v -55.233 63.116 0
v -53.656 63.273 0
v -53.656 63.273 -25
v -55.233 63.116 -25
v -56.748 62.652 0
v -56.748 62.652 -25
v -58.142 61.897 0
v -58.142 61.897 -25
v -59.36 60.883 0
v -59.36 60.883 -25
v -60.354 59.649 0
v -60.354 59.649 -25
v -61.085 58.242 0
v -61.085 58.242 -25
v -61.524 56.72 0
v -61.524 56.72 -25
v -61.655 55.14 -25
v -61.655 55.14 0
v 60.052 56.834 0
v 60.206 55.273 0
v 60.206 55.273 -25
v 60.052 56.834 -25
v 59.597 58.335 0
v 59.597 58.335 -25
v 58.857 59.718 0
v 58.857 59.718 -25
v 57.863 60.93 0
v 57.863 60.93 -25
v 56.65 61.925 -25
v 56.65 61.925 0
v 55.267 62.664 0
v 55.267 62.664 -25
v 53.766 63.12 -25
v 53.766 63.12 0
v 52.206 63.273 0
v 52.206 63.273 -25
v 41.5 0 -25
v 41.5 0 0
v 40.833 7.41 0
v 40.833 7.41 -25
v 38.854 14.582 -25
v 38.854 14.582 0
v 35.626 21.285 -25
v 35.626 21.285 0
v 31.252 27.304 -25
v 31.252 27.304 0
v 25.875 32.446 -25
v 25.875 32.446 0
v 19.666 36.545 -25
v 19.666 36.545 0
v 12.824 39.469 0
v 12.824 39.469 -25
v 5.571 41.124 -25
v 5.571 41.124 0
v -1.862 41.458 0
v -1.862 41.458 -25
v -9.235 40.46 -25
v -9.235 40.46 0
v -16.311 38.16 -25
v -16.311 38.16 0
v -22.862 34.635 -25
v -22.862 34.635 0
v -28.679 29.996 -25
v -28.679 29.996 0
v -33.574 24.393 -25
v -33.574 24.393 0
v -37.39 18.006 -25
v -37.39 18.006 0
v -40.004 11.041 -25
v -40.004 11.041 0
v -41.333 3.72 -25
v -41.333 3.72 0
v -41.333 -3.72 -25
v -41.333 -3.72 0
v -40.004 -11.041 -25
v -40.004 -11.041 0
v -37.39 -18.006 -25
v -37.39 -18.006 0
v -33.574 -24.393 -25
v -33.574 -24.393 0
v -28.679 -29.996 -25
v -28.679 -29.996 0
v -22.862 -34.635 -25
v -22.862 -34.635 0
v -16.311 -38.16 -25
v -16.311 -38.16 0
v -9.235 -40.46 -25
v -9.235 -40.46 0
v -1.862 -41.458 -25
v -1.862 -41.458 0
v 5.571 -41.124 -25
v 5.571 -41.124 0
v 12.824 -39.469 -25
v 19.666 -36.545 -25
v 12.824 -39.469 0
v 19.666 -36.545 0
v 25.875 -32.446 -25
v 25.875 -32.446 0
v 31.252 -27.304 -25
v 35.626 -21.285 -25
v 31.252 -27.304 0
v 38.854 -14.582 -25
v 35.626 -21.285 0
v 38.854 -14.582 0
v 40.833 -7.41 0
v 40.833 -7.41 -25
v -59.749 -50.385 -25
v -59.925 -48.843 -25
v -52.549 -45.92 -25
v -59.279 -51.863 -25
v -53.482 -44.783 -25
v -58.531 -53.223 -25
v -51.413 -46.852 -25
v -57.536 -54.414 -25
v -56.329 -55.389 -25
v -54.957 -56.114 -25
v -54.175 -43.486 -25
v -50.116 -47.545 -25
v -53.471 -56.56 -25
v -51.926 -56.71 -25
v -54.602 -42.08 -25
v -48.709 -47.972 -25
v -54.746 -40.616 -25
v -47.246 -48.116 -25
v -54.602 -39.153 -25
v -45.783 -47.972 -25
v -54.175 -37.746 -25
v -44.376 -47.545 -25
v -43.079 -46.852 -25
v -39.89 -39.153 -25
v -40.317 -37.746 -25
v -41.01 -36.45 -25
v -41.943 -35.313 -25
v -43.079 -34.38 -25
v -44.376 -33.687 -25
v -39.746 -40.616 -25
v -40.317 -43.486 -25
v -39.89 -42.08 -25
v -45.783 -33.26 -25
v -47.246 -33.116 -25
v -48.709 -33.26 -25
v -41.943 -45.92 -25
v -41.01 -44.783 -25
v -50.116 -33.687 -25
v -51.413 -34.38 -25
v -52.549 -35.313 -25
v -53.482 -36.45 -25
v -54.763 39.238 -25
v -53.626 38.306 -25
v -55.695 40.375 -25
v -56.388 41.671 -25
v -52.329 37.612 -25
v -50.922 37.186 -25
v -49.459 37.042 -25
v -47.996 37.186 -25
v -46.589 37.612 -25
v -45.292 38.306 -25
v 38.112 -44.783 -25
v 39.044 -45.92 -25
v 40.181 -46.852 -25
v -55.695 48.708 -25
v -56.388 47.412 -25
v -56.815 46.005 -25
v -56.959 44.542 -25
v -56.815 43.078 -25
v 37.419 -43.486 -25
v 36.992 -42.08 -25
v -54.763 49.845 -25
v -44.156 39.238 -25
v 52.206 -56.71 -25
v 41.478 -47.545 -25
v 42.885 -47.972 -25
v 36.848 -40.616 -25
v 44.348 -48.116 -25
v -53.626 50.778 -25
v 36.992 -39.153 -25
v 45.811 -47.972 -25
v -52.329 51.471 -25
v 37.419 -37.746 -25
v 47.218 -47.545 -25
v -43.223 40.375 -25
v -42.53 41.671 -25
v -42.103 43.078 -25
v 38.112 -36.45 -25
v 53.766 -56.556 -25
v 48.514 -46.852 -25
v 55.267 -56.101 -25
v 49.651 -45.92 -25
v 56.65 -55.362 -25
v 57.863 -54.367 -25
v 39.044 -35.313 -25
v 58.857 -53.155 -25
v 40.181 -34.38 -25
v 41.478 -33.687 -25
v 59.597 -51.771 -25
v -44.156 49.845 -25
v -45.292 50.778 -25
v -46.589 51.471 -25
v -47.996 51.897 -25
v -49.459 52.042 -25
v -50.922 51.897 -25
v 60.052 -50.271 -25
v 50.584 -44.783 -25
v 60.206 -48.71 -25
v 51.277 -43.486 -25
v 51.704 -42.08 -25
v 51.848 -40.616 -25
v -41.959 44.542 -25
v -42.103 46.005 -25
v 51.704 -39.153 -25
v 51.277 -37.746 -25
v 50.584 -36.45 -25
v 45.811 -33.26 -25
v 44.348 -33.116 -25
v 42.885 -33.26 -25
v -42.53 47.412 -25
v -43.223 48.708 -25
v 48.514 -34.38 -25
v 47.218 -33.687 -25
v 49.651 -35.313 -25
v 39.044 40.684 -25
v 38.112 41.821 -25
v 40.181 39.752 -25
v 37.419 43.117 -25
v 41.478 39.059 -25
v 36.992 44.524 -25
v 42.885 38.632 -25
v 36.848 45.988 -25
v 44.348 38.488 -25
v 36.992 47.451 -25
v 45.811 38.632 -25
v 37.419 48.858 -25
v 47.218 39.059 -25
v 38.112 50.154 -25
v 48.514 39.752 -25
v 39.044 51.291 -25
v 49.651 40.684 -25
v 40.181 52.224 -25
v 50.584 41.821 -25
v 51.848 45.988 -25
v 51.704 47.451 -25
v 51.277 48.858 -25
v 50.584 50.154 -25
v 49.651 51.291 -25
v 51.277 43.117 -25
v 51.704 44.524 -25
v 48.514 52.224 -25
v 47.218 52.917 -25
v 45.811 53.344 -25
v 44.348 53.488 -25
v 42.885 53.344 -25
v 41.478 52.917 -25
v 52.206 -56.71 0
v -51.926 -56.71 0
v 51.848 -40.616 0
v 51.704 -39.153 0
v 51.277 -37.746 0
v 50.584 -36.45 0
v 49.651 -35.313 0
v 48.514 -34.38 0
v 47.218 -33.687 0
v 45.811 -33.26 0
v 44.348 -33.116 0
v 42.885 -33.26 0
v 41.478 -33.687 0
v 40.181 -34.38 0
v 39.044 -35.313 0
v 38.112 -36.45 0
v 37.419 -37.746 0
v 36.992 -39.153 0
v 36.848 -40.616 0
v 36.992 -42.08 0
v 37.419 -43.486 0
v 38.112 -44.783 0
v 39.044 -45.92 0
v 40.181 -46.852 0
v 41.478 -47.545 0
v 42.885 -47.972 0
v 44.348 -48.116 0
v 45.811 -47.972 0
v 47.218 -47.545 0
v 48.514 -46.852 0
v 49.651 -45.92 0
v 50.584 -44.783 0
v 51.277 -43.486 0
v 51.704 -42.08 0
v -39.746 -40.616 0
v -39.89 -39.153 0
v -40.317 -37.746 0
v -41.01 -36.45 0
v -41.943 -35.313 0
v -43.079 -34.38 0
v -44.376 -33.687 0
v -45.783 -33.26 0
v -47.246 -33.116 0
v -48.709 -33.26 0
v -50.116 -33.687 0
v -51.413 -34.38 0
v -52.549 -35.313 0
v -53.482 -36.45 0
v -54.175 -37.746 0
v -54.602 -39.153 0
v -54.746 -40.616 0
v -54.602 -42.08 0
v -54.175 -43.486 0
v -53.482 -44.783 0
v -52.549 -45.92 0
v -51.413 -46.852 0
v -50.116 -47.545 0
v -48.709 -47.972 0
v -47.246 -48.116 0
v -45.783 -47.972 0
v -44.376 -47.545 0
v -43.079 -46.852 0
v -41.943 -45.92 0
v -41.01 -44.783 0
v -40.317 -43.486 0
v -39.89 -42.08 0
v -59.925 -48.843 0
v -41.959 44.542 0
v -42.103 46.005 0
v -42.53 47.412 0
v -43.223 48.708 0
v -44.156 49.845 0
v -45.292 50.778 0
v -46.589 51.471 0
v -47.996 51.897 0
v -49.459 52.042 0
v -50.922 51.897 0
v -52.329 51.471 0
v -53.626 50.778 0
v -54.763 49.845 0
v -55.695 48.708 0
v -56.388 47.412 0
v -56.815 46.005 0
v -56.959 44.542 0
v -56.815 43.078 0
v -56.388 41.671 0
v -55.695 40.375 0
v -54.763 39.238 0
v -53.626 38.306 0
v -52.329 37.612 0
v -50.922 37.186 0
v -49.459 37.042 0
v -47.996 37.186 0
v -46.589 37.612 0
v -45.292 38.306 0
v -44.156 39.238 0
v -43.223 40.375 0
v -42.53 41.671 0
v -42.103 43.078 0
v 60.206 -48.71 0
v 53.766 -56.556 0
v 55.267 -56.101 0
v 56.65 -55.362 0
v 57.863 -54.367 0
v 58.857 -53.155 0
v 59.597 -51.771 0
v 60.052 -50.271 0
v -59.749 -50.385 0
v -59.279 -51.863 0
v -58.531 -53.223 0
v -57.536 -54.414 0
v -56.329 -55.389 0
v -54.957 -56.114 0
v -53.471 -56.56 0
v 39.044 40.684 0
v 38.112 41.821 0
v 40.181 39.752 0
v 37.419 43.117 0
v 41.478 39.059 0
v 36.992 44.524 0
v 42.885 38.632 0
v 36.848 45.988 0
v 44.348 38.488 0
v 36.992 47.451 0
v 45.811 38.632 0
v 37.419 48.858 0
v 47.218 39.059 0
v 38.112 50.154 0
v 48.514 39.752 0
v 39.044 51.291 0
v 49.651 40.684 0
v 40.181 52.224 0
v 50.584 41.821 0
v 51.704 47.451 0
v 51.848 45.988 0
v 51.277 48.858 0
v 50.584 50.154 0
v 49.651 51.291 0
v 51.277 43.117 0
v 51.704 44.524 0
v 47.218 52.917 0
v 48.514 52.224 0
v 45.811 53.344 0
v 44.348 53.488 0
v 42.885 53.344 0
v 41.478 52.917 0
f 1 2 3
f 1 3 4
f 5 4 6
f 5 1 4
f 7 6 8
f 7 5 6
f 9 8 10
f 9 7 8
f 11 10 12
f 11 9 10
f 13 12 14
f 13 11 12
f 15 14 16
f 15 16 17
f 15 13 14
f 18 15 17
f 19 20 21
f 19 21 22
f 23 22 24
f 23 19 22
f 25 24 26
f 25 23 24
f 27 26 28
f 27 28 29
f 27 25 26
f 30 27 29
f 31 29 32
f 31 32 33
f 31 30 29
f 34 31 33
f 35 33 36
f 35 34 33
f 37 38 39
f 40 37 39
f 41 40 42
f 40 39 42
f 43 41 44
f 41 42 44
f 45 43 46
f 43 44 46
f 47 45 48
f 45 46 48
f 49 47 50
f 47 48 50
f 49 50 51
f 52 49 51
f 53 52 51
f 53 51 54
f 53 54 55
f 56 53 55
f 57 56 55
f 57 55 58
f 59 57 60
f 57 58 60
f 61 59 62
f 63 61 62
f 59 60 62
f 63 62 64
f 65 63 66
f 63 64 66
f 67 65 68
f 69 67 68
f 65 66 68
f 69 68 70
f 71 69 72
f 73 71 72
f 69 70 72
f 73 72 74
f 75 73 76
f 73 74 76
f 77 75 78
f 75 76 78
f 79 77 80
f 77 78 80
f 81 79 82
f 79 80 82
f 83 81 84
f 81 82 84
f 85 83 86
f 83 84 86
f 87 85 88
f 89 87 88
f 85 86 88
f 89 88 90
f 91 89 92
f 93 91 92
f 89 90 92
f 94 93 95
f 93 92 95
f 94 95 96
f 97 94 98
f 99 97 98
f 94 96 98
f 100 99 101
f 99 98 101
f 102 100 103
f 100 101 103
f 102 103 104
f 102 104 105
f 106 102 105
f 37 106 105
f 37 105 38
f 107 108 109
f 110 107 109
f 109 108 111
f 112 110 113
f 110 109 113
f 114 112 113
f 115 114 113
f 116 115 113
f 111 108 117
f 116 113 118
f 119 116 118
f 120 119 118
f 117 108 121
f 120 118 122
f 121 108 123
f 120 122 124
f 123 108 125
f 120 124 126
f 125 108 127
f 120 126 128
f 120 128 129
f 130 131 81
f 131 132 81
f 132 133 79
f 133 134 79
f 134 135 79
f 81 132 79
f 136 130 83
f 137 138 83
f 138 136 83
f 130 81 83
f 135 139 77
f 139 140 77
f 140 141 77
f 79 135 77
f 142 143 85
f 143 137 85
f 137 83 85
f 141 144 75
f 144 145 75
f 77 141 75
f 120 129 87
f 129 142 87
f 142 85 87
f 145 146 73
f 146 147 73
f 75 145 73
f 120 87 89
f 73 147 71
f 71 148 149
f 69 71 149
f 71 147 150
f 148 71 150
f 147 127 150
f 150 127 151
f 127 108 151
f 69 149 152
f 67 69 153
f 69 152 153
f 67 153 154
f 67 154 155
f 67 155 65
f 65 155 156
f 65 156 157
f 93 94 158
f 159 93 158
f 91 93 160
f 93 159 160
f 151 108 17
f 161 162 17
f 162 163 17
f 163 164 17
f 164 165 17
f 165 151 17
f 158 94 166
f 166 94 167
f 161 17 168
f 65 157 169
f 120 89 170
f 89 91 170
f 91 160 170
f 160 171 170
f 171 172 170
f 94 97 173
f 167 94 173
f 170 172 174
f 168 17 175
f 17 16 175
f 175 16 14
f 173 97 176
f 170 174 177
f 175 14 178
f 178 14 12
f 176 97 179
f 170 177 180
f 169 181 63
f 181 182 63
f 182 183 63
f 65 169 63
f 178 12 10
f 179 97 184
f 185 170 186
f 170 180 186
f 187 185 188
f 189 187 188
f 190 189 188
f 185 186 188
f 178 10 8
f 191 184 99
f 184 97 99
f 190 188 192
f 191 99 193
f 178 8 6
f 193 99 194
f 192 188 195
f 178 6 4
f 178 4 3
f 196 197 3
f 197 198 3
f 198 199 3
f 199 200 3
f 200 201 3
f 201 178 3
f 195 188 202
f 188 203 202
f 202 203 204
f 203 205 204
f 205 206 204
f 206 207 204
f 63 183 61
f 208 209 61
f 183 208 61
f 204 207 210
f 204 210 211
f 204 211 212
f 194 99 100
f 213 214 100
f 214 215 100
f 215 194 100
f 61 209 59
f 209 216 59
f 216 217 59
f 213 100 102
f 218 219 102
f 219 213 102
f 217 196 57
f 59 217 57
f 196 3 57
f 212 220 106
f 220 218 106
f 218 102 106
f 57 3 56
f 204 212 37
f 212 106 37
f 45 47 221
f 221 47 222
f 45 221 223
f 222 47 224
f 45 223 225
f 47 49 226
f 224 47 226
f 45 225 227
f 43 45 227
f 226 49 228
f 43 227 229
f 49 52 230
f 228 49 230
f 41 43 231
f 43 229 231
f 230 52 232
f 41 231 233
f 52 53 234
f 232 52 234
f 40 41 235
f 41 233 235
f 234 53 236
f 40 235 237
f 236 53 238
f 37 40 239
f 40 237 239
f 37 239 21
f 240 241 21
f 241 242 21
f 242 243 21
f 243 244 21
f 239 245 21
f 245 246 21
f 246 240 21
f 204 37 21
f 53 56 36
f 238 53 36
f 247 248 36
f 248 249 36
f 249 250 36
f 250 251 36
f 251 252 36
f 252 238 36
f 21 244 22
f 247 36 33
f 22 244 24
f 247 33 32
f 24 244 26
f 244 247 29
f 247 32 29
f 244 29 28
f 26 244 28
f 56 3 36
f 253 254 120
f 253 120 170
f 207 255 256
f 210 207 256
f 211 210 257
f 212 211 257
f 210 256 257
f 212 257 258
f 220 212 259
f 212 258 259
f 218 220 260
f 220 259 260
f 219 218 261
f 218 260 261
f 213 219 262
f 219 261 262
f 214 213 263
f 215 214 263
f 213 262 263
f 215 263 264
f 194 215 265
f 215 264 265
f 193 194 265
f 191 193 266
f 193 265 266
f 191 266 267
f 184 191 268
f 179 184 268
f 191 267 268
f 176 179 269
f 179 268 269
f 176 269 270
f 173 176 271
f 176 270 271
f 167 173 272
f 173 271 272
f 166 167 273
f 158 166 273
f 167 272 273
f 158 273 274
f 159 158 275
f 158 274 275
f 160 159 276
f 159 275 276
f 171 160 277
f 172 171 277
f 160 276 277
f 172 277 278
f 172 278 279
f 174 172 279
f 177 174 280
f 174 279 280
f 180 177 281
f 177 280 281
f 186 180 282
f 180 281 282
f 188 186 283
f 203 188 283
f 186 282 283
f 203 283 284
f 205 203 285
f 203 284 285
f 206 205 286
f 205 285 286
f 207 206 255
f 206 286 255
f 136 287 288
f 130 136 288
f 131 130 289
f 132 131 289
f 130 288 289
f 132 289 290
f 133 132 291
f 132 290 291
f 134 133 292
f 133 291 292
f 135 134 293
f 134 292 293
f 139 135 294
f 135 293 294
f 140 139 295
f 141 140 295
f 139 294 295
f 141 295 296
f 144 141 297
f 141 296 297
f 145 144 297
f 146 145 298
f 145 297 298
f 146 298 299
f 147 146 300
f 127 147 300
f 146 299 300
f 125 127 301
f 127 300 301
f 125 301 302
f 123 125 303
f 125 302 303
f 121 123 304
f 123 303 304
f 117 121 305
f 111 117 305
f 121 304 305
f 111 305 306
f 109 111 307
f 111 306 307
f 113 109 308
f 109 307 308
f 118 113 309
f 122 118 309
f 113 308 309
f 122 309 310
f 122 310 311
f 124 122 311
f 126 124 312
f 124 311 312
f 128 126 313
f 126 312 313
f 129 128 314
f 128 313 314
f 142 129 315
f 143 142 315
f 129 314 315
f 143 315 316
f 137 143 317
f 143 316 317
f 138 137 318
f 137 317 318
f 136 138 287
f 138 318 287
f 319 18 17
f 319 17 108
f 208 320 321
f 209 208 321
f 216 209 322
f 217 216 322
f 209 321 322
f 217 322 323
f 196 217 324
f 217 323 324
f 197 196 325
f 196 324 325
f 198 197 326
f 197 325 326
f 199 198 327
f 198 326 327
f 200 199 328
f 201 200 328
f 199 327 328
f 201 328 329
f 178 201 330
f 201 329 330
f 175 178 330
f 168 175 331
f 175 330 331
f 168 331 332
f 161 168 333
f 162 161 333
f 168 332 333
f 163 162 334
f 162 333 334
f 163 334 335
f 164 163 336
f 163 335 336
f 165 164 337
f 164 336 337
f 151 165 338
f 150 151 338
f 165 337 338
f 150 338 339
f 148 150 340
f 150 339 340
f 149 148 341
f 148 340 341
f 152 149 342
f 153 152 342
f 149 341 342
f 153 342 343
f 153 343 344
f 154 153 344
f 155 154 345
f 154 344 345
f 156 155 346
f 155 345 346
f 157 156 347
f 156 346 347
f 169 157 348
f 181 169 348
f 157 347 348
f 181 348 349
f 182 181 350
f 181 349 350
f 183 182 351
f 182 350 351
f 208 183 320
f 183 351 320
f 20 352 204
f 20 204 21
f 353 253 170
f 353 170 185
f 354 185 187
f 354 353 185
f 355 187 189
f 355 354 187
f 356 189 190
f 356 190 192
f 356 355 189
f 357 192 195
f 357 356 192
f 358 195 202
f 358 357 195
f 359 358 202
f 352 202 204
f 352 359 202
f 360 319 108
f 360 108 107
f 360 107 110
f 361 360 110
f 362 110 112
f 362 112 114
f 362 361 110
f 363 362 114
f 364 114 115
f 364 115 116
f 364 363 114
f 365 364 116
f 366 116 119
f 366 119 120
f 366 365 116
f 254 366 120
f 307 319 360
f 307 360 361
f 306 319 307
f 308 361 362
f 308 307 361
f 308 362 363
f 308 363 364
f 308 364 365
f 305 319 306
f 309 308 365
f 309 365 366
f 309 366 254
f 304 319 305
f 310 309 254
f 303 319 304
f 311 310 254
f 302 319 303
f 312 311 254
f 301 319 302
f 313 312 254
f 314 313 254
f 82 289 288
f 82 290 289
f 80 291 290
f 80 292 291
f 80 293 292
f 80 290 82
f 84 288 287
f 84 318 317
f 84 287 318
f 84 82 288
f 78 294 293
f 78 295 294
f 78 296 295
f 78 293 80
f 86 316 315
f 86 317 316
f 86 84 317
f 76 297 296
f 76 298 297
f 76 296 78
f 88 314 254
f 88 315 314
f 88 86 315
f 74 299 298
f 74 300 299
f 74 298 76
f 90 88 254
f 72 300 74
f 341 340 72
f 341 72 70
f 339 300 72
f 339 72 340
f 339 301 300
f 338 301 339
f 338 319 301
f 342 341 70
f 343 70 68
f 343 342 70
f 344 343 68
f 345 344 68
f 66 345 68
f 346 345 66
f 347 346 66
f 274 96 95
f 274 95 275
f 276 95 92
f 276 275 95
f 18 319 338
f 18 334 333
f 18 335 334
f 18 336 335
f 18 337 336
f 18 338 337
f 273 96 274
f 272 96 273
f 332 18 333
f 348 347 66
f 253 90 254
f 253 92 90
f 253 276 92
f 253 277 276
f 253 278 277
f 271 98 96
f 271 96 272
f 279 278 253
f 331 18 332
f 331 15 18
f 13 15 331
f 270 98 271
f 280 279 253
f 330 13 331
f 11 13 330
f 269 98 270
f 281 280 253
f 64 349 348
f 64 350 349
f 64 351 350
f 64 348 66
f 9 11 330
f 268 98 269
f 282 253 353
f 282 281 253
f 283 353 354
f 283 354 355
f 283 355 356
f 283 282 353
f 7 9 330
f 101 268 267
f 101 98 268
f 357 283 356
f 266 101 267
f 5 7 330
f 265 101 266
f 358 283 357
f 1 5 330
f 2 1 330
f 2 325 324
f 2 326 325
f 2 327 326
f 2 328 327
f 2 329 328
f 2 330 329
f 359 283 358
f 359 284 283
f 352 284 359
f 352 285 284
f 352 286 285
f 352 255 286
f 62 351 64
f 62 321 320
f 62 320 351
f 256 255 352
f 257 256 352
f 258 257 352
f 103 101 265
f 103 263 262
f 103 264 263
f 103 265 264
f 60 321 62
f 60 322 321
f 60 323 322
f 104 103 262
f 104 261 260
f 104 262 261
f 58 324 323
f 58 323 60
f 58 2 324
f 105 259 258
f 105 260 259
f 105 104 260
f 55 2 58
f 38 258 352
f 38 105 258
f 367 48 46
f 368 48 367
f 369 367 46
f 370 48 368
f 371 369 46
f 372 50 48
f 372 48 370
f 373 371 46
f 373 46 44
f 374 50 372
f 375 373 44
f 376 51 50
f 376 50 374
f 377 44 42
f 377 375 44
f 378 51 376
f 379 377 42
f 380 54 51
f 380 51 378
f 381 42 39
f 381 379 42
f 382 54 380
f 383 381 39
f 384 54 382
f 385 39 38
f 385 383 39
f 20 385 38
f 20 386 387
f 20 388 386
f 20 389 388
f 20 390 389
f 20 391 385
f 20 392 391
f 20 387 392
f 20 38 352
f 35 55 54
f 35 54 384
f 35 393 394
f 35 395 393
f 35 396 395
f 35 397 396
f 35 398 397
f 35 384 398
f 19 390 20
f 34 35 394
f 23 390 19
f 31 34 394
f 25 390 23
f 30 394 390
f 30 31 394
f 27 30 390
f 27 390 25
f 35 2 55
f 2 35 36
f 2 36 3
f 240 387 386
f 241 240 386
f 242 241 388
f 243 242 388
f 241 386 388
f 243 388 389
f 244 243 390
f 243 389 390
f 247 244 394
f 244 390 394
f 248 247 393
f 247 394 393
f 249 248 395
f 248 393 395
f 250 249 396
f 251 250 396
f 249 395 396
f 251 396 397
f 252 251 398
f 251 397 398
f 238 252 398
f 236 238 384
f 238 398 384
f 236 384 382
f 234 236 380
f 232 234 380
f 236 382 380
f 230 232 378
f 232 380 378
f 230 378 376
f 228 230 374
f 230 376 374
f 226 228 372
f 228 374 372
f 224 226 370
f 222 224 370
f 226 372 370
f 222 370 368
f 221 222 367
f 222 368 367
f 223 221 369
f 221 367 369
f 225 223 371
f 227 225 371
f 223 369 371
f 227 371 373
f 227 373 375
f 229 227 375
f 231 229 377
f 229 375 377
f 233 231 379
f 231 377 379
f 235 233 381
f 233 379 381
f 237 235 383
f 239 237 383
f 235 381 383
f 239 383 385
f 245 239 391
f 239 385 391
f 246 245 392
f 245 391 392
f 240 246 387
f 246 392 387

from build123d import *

# Parameters (mm, degrees)
F0_R     = 7.5
F0_R_2   = 41.5
F1_DEPTH = 25


with BuildPart() as f1:
    # F0 (on Top) → F1 (new body)
    with BuildSketch(Plane.XY):
        with BuildLine():
            ThreePointArc((-59.925168, -48.84305), (-57.53589, -54.413699), (-51.926274, -56.709997))
            Line((-51.926274, -56.709997), (52.20569, -56.709997))
            ThreePointArc((52.20569, -56.709997), (57.862545, -54.366851), (60.20569, -48.709997))
            Line((60.20569, -48.709997), (60.20569, 55.273405))
            ThreePointArc((60.20569, 55.273405), (57.862545, 60.93026), (52.20569, 63.273405))
            Line((52.20569, 63.273405), (-53.655924, 63.273405))
            ThreePointArc((-53.655924, 63.273405), (-59.359626, 60.883021), (-61.654818, 55.140352))
            Line((-61.654818, 55.140352), (-59.925168, -48.84305))
        make_face()
        with Locations((-47.246009, -40.616337)):
            Circle(F0_R, mode=Mode.SUBTRACT)
        with Locations((44.347703, -40.616337)):
            Circle(F0_R, mode=Mode.SUBTRACT)
        Circle(F0_R_2, mode=Mode.SUBTRACT)
        with Locations((-49.459223, 44.541564)):
            Circle(F0_R, mode=Mode.SUBTRACT)
        with Locations((44.347703, 45.987621)):
            Circle(F0_R, mode=Mode.SUBTRACT)
    extrude(amount=-F1_DEPTH)


solid = f1.part
